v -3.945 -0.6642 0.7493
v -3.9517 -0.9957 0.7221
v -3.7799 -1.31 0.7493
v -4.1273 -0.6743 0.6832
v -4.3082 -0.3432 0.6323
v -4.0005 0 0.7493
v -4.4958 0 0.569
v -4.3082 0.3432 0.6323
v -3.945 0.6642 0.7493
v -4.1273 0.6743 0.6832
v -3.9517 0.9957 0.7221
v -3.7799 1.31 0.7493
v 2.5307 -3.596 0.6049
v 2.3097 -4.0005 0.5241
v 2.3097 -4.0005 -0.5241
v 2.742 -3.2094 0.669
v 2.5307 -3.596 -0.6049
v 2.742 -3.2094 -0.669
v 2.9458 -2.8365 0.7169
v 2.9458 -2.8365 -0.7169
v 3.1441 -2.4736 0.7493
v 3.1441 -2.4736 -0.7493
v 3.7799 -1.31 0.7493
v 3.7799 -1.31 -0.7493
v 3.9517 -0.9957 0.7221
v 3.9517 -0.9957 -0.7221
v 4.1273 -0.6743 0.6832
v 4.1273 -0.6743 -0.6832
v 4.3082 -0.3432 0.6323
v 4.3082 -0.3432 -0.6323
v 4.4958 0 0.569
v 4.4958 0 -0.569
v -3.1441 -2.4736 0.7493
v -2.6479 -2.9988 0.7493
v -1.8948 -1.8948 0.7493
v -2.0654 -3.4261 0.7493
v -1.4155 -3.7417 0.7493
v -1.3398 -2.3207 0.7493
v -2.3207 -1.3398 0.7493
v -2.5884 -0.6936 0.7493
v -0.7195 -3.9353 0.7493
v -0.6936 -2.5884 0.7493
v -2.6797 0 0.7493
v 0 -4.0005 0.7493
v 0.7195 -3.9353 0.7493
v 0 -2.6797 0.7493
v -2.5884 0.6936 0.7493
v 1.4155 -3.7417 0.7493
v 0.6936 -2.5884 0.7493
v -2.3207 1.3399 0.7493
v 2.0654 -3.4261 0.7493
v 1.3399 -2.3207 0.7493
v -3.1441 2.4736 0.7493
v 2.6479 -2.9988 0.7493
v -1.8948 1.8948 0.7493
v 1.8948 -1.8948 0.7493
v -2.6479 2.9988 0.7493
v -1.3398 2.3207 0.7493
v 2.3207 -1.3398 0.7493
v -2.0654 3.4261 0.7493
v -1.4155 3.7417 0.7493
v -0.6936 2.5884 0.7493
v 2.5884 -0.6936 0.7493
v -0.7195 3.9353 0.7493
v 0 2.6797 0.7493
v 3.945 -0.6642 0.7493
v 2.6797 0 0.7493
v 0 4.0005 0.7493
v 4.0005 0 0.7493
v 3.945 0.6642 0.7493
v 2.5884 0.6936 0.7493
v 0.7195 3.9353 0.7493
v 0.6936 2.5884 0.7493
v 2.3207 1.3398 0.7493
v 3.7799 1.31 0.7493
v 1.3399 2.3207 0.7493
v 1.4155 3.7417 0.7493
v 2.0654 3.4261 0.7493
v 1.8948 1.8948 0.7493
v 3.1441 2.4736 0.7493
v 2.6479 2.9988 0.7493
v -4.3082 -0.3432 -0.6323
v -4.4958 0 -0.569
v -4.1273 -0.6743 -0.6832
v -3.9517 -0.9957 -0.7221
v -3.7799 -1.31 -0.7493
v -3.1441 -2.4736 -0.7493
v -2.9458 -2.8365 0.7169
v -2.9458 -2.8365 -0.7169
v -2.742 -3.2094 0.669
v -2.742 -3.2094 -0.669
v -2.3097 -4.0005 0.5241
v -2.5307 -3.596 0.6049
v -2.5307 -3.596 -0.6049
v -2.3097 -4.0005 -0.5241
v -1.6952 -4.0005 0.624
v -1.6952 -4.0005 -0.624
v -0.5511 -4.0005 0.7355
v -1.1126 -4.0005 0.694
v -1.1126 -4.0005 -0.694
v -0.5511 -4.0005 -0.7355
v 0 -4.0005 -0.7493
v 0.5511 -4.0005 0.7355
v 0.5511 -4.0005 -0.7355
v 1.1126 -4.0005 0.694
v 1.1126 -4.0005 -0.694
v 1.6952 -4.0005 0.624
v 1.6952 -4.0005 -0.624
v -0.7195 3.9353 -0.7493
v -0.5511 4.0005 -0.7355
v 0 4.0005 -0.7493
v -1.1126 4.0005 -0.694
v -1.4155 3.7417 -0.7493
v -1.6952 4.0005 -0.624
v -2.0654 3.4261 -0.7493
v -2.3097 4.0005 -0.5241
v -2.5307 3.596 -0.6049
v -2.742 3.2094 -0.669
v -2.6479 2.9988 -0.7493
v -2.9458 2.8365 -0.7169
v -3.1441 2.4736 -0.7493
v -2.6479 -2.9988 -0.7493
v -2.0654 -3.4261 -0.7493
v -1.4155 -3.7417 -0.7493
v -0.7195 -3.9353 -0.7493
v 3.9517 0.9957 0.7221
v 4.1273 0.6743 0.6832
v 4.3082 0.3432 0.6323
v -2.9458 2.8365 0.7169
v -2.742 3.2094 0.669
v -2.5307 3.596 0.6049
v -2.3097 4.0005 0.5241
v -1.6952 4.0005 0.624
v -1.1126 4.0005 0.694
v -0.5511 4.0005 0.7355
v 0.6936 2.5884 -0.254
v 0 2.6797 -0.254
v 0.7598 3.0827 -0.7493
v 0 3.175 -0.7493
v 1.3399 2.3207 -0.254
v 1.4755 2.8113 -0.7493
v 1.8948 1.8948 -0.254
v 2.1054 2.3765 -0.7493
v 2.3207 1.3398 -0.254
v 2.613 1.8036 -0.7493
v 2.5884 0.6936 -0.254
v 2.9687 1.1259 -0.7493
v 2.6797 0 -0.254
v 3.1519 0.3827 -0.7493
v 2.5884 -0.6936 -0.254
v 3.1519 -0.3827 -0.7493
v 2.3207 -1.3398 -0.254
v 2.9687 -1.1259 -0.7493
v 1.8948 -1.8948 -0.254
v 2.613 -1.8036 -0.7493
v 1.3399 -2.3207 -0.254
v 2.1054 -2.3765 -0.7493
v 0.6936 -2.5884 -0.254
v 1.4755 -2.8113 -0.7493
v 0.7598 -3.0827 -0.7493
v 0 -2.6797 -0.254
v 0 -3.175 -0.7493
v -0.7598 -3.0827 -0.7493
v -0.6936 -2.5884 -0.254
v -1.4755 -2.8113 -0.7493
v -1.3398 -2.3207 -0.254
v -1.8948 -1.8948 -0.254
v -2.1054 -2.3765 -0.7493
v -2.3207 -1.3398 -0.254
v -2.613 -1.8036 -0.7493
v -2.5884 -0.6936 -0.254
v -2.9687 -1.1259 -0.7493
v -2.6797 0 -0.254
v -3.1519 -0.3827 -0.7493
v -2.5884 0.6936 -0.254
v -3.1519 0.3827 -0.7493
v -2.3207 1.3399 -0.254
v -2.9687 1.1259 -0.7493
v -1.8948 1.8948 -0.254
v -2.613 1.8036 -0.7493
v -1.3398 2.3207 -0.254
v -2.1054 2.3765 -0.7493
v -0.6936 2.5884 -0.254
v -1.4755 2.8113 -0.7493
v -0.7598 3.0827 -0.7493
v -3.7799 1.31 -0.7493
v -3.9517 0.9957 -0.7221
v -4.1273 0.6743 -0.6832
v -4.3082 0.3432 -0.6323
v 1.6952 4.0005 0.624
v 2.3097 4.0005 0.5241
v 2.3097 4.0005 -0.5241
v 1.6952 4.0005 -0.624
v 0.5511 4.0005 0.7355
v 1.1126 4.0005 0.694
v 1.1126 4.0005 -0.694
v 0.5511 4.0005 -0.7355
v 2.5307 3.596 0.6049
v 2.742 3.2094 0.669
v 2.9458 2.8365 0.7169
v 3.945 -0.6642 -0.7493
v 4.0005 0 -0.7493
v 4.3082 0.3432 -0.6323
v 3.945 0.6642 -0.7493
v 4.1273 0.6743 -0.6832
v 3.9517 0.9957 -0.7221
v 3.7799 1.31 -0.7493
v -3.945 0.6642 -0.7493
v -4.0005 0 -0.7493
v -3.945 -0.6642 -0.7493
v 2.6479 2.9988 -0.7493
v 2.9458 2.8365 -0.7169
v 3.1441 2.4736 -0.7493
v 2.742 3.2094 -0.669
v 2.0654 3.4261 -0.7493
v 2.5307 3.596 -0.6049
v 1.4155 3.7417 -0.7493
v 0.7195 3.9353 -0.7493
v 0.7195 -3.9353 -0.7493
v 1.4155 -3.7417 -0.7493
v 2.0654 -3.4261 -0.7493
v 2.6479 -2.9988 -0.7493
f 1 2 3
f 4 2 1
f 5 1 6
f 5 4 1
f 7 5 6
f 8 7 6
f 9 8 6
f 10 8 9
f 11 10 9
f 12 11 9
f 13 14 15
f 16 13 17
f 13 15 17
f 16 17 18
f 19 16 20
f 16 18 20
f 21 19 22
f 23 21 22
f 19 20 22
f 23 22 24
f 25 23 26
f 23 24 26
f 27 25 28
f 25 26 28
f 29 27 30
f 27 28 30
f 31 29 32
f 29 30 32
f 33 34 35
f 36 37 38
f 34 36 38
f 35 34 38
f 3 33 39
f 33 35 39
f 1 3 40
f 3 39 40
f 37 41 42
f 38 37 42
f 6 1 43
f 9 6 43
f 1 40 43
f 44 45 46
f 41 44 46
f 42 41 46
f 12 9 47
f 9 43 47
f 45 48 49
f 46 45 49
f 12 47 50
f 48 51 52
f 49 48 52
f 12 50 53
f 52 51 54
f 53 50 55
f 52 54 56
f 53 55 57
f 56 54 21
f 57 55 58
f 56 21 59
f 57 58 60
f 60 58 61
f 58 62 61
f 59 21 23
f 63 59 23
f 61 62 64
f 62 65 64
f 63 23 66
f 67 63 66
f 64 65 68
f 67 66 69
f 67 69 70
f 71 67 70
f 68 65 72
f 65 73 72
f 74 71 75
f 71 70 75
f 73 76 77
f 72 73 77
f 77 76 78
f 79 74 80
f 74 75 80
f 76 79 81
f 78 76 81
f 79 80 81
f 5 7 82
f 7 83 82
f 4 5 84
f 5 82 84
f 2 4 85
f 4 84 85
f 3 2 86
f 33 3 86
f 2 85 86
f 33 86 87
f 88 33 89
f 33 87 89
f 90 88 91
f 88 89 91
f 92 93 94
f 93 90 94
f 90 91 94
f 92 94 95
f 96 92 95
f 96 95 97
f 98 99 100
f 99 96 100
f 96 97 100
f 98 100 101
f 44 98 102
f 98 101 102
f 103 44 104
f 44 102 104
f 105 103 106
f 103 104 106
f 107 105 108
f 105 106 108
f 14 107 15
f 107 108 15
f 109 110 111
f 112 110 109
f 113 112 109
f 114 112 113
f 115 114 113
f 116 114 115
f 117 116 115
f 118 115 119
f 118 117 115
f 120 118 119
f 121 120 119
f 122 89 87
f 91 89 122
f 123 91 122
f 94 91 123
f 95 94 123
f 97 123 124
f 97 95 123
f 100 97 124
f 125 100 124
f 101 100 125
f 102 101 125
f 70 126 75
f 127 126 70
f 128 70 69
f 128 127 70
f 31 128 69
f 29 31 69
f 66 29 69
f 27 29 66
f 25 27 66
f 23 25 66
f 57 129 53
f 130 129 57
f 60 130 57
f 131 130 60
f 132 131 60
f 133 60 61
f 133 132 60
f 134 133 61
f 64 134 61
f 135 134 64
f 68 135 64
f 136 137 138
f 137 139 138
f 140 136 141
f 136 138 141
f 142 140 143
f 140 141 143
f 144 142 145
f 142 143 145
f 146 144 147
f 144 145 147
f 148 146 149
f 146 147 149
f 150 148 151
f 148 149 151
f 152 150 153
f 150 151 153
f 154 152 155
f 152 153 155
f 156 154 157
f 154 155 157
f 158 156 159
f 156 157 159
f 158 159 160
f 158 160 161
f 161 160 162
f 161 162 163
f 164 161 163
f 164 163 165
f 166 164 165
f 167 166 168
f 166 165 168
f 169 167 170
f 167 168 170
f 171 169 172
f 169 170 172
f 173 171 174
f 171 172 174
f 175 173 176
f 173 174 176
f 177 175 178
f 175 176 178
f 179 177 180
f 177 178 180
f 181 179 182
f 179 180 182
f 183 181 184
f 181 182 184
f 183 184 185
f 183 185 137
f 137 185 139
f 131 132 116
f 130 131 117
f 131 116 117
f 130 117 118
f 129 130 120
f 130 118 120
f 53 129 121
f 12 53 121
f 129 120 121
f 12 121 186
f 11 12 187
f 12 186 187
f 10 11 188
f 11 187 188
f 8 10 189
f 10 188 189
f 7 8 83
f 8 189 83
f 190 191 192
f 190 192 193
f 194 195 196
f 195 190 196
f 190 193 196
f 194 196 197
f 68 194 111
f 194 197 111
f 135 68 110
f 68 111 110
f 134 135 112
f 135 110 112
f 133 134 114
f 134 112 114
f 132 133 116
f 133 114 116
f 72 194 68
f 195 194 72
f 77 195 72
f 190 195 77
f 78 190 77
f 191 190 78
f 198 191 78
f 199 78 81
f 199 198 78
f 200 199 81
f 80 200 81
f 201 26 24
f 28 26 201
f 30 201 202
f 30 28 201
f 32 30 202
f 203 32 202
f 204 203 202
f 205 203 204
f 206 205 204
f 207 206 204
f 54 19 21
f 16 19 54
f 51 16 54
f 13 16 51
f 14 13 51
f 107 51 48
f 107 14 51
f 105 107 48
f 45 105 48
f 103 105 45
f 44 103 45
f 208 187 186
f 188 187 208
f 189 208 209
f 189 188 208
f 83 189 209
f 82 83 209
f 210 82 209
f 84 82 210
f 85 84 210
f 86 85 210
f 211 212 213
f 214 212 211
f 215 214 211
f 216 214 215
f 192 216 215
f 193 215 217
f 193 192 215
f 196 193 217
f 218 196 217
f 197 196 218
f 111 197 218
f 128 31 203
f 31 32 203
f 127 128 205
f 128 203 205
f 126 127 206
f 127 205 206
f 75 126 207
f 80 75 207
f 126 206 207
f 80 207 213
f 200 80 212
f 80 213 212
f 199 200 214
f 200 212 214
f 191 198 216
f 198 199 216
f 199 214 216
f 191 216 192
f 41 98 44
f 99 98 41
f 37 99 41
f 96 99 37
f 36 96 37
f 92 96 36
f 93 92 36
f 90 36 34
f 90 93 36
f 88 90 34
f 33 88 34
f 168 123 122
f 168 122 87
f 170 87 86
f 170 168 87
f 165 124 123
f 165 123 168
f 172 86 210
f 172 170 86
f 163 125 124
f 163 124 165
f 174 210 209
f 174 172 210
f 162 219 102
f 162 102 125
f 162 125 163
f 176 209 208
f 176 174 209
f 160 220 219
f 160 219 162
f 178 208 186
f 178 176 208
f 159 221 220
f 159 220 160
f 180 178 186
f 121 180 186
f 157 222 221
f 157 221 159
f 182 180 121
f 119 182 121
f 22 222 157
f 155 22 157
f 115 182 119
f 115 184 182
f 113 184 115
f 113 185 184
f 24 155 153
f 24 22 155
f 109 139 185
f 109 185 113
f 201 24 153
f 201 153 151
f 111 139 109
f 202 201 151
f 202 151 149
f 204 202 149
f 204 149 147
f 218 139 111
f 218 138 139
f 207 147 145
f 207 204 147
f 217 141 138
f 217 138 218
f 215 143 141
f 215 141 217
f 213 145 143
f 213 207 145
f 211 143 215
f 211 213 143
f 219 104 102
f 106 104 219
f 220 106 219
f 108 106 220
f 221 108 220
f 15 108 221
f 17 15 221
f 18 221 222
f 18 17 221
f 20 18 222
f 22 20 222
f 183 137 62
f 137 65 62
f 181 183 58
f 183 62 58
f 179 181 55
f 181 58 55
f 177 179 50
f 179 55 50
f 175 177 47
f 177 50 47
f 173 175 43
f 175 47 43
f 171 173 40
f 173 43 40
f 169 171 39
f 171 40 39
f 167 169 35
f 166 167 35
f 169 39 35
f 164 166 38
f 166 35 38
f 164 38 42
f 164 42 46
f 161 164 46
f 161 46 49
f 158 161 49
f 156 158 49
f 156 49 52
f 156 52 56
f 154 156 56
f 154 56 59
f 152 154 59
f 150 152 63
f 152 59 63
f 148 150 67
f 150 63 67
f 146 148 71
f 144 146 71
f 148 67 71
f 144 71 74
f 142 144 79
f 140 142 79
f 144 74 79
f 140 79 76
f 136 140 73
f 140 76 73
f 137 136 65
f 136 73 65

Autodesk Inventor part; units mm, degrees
sketch "Sketch_1" plane through (0, 0, 0) normal (1, 0, 0) x (0, 1, 0)
  line L0 (0, -0.7493) -> (0, 0.7493)
  line L1 (0, 0.7493) -> (4.0005, 0.7493)
  line L2 (4.0005, 0.7493) -> (4.8006, 0.4581)
  line L3 (4.8006, 0.4581) -> (4.8006, -0.4581)
  line L4 (4.8006, -0.4581) -> (4.0005, -0.7493)
  line L5 (4.0005, -0.7493) -> (0, -0.7493)
  line L6 (0, -0.7493) -> (0, 0.7493)
revolve "Revolution1" add sketch "Sketch_1" angle 360 about axis through (0, 0, -0.7493) along (0, 0, -1)
sketch "Sketch_2" plane through (0, 0, 0) normal (0, 0, 1) x (1, 0, 0)
  line L0 (-8.001, 8.001) -> (-8.001, -8.001)
  line L1 (-8.001, -8.001) -> (8.001, -8.001)
  line L2 (8.001, -8.001) -> (8.001, 8.001)
  line L3 (8.001, 8.001) -> (-8.001, 8.001)
  line L4 (-4.4958, 0) -> (-2.3097, -4.0005)
  line L5 (-2.3097, -4.0005) -> (2.3097, -4.0005)
  line L6 (2.3097, -4.0005) -> (4.4958, 0)
  line L7 (4.4958, 0) -> (2.3097, 4.0005)
  line L8 (2.3097, 4.0005) -> (-2.3097, 4.0005)
  line L9 (-2.3097, 4.0005) -> (-4.4958, 0)
extrude "Extrusion1" cut sketch "Sketch_2" along normal mid plane 2.9972
sketch "Sketch3" plane through (0, 0, -0.7493) normal (0, 0, -1) x (-1, 0, 0)
  point P0 (0, 0)
hole "Drilling 1" at (0, 0, -0.7493) direction (0, 0, 1) diameter 5.3594 depth 1.4986 countersink diameter 6.35 countersink angle 90 thread size "1/4-28 UNF" class "2B" standard "ANSI Unified Screw Threads"
ref_plane "nut_XY" through (0, 0, 0.7493) normal (0, 0, 1) x (1, 0, 0)
ref_plane "nut_YZ" through (0, 0, 0.7493) normal (1, 0, 0) x (0, 1, 0)
ref_plane "nut_ZX" through (0, 0, 0.7493) normal (0, 1, 0) x (0, 0, 1)
properties part number "AT513H"
